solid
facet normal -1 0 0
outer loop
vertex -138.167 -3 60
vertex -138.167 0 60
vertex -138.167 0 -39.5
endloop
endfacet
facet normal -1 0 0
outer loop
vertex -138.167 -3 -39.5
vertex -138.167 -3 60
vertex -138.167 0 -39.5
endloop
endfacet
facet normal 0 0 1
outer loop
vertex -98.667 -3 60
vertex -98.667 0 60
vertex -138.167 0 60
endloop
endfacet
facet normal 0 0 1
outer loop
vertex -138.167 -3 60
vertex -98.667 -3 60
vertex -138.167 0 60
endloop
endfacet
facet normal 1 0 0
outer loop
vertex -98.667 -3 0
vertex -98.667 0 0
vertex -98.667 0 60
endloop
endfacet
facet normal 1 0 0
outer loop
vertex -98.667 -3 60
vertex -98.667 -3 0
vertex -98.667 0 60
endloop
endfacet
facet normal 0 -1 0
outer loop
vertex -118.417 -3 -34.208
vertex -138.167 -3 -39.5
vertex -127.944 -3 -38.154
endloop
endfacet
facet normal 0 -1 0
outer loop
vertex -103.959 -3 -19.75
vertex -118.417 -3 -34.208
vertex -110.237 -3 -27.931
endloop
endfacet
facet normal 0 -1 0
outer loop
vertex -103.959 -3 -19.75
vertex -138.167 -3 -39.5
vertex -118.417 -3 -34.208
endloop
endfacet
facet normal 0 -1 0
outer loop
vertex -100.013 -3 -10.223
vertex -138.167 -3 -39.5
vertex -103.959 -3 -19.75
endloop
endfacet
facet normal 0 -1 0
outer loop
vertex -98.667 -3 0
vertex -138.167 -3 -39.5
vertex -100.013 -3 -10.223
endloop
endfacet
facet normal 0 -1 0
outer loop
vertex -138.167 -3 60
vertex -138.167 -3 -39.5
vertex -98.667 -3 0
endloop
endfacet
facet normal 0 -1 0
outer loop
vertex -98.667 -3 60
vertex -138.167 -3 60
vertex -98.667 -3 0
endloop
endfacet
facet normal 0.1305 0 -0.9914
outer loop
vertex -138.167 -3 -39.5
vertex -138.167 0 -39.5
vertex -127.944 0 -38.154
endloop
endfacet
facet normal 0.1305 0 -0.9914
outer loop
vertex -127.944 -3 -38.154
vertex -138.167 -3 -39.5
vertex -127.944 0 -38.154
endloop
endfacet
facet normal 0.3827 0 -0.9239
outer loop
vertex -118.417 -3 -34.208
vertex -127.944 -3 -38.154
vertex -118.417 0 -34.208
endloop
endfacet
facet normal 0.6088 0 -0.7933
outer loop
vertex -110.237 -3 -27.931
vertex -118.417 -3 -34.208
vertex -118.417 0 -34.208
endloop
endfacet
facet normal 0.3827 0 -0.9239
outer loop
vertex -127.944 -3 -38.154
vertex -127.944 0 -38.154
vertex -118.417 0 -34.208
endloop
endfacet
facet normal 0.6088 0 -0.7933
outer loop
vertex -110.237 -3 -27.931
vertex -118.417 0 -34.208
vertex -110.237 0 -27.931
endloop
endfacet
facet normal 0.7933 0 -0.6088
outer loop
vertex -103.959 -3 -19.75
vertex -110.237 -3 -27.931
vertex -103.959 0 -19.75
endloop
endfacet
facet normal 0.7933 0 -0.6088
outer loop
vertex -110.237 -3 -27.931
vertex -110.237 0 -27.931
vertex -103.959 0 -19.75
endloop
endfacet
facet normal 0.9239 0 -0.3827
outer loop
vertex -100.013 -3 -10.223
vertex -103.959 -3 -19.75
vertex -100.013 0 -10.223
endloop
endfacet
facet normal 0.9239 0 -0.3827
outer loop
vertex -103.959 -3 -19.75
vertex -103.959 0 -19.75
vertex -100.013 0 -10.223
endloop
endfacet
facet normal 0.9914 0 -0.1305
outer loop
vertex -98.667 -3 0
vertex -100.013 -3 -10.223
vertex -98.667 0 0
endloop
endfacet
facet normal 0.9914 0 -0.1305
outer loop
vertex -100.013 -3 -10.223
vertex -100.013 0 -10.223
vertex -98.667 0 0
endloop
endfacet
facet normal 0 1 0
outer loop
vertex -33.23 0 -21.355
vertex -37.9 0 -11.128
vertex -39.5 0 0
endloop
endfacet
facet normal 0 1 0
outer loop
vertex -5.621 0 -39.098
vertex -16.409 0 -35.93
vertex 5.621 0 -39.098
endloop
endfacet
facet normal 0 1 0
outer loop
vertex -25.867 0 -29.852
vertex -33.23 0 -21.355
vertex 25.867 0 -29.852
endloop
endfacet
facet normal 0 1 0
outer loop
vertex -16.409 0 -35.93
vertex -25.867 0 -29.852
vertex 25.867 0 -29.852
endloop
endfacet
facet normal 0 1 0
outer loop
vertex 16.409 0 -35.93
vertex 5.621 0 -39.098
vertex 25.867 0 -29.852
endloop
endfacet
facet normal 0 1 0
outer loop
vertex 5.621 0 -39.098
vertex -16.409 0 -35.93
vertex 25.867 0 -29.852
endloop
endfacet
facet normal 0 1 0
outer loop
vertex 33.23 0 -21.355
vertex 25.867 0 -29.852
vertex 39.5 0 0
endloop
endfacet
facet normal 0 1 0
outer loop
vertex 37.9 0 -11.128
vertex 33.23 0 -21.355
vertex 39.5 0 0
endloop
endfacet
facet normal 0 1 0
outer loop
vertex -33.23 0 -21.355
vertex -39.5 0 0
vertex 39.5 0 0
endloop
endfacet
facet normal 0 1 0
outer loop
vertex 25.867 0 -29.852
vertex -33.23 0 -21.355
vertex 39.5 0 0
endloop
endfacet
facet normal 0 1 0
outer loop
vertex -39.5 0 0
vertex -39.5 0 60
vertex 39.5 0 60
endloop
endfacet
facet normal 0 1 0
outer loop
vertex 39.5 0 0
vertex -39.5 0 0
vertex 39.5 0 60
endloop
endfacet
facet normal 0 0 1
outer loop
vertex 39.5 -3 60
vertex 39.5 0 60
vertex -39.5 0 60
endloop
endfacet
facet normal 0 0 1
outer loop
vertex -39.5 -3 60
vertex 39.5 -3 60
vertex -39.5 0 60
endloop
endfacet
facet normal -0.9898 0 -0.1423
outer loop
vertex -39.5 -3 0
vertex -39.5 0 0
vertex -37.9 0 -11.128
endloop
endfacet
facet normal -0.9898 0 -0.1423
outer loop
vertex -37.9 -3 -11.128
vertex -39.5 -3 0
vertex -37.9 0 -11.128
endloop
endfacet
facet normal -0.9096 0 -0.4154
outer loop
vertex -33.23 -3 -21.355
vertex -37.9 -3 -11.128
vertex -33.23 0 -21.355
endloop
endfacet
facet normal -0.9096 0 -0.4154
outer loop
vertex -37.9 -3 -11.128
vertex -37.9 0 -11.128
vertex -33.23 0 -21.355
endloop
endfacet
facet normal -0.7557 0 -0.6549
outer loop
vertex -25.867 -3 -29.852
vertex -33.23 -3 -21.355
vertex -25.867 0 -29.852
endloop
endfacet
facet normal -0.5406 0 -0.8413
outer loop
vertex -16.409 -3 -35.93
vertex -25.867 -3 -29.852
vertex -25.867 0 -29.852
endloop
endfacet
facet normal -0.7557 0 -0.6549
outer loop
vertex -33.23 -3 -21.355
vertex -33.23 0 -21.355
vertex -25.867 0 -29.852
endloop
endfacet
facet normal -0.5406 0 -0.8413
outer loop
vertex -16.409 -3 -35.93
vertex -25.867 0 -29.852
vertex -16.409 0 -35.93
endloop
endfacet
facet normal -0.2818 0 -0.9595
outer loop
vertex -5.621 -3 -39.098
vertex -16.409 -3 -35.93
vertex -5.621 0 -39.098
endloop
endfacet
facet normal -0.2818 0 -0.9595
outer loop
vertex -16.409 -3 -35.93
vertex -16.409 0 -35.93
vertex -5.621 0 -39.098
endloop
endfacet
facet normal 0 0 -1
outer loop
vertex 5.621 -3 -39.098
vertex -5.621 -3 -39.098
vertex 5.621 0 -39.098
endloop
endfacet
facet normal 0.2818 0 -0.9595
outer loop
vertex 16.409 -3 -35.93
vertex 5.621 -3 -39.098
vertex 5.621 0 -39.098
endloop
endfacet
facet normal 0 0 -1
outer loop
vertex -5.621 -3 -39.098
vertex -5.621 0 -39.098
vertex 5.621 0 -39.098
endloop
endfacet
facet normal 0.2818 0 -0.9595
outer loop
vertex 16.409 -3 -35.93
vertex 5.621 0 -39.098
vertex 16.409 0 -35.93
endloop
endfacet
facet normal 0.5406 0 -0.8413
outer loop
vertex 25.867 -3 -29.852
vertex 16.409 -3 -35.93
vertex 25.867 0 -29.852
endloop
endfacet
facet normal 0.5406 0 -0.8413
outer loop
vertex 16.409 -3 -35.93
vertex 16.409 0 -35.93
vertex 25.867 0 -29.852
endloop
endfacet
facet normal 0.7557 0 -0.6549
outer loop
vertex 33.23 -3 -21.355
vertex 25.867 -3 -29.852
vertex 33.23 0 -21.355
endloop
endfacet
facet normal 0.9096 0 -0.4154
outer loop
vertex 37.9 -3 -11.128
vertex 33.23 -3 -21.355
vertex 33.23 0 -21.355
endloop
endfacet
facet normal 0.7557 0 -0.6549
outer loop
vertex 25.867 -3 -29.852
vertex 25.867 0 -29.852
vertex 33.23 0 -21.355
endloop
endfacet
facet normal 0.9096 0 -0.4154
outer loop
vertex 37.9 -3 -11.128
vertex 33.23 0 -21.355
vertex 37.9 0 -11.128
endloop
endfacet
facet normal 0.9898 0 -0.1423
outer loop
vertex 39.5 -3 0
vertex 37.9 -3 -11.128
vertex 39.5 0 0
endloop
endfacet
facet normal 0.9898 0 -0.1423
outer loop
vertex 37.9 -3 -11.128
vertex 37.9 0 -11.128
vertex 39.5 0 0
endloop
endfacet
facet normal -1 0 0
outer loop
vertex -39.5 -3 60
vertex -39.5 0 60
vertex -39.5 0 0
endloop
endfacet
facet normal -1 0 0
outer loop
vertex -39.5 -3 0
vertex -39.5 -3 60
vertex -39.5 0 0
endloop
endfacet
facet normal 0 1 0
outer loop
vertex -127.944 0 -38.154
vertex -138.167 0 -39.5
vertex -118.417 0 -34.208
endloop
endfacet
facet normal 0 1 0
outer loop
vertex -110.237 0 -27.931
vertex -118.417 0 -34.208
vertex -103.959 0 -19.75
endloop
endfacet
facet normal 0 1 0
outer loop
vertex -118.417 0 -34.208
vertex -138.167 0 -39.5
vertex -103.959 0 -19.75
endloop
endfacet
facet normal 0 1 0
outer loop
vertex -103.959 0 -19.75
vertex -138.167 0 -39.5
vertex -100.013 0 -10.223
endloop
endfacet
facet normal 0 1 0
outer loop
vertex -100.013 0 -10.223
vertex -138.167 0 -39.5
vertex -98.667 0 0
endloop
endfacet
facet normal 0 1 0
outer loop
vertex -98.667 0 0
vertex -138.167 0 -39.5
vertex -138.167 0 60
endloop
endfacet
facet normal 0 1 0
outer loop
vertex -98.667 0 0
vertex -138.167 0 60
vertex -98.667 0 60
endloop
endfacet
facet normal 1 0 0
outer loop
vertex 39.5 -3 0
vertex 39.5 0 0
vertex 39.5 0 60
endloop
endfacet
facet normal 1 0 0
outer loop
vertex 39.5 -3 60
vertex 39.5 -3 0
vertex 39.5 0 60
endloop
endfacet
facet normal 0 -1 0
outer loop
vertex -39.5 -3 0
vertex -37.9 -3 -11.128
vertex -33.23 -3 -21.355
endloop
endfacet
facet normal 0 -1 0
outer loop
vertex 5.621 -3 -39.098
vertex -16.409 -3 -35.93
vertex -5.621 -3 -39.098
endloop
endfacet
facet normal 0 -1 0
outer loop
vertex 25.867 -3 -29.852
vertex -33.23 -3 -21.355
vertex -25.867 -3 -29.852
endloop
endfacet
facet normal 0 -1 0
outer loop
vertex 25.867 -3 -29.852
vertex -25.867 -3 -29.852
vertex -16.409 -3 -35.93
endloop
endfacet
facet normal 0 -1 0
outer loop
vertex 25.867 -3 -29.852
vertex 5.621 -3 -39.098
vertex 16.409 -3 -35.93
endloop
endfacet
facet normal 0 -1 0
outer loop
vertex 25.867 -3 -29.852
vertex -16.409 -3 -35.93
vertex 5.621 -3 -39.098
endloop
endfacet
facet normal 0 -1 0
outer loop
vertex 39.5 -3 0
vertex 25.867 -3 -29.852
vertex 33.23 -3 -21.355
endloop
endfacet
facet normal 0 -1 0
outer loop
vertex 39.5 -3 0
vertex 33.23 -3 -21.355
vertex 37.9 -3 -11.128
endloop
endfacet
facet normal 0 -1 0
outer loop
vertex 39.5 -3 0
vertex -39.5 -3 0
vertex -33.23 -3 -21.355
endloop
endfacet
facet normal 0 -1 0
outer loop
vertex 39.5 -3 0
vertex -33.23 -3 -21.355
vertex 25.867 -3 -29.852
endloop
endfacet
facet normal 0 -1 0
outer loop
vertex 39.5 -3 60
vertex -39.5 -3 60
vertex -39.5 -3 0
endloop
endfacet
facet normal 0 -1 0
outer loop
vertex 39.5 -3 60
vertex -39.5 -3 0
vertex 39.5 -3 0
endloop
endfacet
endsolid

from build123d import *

# Parameters (mm, degrees)
F1_DEPTH = 3
F2_DEPTH = 3


with BuildPart() as f1:
    # F0 (on Front) → F1 (new body)
    with BuildSketch(Plane.XZ):
        with BuildLine():
            Line((-39.5, 60), (-39.5, 0))
            ThreePointArc((-39.5, 0), (0, -39.5), (39.5, 0))
            Line((39.5, 0), (39.5, 60))
            Line((39.5, 60), (-39.5, 60))
        make_face()
    extrude(amount=F1_DEPTH)

    # F0 (on Front) → F2 (join)
    with BuildSketch(Plane.XZ):
        with BuildLine():
            Line((-39.5, 60), (-39.5, 0))
            ThreePointArc((-39.5, 0), (0, -39.5), (39.5, 0))
            Line((39.5, 0), (39.5, 60))
            Line((39.5, 60), (-39.5, 60))
        make_face()
        with BuildLine():
            Line((-138.167471, 0), (-138.167471, -39.5))
            ThreePointArc((-138.167471, -39.5), (-110.236753, -27.930718), (-98.667471, 0))
            Line((-98.667471, 0), (-98.667471, 60))
            Line((-98.667471, 60), (-138.167471, 60))
            Line((-138.167471, 60), (-138.167471, 0))
        make_face()
    extrude(amount=F2_DEPTH)


solid = f1.part
